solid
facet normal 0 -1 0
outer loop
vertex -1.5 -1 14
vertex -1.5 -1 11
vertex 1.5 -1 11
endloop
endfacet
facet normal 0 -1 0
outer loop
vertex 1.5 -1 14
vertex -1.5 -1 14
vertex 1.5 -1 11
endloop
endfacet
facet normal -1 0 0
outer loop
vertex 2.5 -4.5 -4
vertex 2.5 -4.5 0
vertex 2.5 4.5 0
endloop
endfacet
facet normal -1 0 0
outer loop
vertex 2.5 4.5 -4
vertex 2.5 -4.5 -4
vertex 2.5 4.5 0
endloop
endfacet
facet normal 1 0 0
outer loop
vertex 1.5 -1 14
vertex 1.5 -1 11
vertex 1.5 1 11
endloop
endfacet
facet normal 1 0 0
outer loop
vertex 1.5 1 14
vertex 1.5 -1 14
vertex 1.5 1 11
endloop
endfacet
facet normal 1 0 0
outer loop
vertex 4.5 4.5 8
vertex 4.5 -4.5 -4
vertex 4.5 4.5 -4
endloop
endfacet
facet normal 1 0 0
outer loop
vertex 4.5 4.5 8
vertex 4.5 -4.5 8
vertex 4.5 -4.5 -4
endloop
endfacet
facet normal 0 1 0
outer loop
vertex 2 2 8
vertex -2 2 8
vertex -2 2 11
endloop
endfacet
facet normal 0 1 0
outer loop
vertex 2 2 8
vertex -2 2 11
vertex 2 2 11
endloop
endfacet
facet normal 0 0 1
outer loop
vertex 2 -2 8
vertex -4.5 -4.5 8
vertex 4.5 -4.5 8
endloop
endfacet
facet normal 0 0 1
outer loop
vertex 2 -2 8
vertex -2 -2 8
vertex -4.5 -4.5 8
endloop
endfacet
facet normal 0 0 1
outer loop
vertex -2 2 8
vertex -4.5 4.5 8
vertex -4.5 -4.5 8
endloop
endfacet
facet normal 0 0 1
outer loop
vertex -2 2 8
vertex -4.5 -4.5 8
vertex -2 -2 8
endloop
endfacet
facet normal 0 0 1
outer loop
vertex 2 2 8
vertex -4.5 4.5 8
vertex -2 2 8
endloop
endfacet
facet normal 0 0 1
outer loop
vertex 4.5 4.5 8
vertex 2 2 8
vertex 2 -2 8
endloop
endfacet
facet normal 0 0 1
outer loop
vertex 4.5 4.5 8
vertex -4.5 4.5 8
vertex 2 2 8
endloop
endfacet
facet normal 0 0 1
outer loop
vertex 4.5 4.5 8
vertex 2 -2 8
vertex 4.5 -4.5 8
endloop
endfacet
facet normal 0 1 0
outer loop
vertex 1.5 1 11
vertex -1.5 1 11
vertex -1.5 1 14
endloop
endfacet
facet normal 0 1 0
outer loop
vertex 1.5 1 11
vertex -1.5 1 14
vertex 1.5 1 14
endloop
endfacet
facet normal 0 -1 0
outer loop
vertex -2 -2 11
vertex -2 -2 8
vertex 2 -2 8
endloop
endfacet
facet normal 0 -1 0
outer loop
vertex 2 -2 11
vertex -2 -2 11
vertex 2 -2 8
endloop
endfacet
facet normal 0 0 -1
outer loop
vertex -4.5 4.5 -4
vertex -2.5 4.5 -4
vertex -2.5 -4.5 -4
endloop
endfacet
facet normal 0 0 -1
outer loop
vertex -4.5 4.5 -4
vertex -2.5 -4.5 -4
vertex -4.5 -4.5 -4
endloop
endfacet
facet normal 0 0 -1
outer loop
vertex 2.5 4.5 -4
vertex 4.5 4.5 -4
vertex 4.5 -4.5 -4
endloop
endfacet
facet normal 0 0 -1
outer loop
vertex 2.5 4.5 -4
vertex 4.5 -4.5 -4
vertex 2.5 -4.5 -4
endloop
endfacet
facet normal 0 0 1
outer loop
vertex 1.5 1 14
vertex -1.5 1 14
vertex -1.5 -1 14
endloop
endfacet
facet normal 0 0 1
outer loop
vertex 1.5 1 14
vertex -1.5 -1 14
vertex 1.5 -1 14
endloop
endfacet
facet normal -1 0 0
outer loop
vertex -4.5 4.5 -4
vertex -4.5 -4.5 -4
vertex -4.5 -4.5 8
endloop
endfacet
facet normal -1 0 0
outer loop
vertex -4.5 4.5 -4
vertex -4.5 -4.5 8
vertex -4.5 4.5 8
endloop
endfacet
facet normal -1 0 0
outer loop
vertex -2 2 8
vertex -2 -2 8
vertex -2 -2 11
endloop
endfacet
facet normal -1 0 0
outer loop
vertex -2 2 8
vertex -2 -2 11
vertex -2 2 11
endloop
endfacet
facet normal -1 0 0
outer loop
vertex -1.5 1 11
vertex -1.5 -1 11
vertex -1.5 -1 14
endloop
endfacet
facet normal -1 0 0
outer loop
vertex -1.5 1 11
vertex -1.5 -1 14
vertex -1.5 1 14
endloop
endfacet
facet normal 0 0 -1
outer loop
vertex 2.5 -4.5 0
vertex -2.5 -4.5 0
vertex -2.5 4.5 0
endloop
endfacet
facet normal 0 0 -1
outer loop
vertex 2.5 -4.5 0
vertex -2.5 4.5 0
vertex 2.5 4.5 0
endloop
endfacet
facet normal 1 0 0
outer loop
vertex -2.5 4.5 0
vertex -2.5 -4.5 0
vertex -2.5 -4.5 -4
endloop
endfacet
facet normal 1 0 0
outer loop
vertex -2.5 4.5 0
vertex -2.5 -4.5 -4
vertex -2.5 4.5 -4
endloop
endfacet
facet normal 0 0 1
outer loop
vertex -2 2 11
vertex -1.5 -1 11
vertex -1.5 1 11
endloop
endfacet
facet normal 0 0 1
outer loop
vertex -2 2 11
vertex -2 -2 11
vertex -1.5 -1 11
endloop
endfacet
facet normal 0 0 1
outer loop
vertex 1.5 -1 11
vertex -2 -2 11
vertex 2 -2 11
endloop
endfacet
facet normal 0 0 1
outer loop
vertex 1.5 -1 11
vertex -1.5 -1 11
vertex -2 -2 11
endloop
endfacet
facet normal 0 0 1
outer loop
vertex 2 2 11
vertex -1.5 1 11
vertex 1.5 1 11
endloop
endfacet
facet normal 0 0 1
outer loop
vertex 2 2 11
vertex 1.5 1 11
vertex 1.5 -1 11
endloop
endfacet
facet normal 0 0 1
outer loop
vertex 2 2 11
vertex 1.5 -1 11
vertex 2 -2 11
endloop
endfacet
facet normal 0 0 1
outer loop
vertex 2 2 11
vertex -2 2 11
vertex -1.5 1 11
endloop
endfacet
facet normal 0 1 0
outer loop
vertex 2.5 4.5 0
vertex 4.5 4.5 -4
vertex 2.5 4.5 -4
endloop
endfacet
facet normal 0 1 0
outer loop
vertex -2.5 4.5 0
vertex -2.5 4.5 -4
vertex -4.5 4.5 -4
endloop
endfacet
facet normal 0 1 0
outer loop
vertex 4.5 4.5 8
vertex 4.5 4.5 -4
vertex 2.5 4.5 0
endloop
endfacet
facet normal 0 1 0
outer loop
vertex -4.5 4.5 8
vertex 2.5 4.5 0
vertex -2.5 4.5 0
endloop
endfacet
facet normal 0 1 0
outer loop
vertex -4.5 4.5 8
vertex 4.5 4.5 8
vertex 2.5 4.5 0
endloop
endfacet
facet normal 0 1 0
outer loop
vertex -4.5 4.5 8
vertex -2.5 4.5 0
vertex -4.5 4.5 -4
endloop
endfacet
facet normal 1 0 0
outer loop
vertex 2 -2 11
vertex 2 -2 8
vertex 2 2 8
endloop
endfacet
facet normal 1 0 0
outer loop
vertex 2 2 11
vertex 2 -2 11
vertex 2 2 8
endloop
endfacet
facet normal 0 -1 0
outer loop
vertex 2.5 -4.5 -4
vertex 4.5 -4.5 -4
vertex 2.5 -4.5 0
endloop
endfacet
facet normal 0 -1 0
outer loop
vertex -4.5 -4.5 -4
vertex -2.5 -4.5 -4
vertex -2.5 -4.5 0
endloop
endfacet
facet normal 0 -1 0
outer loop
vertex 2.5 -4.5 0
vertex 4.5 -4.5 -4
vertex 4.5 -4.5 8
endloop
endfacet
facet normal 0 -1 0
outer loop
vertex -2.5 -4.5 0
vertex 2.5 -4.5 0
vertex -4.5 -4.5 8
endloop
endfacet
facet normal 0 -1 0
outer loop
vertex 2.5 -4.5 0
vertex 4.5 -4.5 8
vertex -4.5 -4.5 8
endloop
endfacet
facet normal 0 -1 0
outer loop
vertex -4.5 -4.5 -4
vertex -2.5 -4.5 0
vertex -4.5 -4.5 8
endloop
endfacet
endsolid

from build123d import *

# Parameters (mm, degrees)
SKETCH1_W           = 9
SKETCH1_H           = 9
MAIN_BODY_DEPTH     = 8
SKETCH2_W           = 4
SKETCH2_H           = 4
BOSS_EXTRUDE2_DEPTH = 3
SKETCH3_W           = 3
SKETCH3_H           = 2
BOSS_EXTRUDE3_DEPTH = 3
SKETCH4_W           = 2
SKETCH4_H           = 9
PINS_DEPTH          = 4


with BuildPart() as part:
    # Sketch1 → MAIN BODY (new body)
    with BuildSketch(Plane.XY):
        Rectangle(SKETCH1_W, SKETCH1_H)
    extrude(amount=MAIN_BODY_DEPTH)

    # Sketch2 → Boss-Extrude2 (add)
    with BuildSketch(Plane.XY.offset(8)):
        Rectangle(SKETCH2_W, SKETCH2_H)
    extrude(amount=BOSS_EXTRUDE2_DEPTH)

    # Sketch3 → Boss-Extrude3 (add)
    with BuildSketch(Plane.XY.offset(11)):
        Rectangle(SKETCH3_W, SKETCH3_H)
    extrude(amount=BOSS_EXTRUDE3_DEPTH)

    # Sketch4 → PINS (add)
    with BuildSketch(Plane(origin=(0, 0, 0), x_dir=(-1, 0, 0), z_dir=(0, 0, -1))):
        with Locations((-3.5, 0)):
            Rectangle(SKETCH4_W, SKETCH4_H)
        with Locations((3.5, 0)):
            Rectangle(SKETCH4_W, SKETCH4_H)
    extrude(amount=PINS_DEPTH)


solid = part.part
